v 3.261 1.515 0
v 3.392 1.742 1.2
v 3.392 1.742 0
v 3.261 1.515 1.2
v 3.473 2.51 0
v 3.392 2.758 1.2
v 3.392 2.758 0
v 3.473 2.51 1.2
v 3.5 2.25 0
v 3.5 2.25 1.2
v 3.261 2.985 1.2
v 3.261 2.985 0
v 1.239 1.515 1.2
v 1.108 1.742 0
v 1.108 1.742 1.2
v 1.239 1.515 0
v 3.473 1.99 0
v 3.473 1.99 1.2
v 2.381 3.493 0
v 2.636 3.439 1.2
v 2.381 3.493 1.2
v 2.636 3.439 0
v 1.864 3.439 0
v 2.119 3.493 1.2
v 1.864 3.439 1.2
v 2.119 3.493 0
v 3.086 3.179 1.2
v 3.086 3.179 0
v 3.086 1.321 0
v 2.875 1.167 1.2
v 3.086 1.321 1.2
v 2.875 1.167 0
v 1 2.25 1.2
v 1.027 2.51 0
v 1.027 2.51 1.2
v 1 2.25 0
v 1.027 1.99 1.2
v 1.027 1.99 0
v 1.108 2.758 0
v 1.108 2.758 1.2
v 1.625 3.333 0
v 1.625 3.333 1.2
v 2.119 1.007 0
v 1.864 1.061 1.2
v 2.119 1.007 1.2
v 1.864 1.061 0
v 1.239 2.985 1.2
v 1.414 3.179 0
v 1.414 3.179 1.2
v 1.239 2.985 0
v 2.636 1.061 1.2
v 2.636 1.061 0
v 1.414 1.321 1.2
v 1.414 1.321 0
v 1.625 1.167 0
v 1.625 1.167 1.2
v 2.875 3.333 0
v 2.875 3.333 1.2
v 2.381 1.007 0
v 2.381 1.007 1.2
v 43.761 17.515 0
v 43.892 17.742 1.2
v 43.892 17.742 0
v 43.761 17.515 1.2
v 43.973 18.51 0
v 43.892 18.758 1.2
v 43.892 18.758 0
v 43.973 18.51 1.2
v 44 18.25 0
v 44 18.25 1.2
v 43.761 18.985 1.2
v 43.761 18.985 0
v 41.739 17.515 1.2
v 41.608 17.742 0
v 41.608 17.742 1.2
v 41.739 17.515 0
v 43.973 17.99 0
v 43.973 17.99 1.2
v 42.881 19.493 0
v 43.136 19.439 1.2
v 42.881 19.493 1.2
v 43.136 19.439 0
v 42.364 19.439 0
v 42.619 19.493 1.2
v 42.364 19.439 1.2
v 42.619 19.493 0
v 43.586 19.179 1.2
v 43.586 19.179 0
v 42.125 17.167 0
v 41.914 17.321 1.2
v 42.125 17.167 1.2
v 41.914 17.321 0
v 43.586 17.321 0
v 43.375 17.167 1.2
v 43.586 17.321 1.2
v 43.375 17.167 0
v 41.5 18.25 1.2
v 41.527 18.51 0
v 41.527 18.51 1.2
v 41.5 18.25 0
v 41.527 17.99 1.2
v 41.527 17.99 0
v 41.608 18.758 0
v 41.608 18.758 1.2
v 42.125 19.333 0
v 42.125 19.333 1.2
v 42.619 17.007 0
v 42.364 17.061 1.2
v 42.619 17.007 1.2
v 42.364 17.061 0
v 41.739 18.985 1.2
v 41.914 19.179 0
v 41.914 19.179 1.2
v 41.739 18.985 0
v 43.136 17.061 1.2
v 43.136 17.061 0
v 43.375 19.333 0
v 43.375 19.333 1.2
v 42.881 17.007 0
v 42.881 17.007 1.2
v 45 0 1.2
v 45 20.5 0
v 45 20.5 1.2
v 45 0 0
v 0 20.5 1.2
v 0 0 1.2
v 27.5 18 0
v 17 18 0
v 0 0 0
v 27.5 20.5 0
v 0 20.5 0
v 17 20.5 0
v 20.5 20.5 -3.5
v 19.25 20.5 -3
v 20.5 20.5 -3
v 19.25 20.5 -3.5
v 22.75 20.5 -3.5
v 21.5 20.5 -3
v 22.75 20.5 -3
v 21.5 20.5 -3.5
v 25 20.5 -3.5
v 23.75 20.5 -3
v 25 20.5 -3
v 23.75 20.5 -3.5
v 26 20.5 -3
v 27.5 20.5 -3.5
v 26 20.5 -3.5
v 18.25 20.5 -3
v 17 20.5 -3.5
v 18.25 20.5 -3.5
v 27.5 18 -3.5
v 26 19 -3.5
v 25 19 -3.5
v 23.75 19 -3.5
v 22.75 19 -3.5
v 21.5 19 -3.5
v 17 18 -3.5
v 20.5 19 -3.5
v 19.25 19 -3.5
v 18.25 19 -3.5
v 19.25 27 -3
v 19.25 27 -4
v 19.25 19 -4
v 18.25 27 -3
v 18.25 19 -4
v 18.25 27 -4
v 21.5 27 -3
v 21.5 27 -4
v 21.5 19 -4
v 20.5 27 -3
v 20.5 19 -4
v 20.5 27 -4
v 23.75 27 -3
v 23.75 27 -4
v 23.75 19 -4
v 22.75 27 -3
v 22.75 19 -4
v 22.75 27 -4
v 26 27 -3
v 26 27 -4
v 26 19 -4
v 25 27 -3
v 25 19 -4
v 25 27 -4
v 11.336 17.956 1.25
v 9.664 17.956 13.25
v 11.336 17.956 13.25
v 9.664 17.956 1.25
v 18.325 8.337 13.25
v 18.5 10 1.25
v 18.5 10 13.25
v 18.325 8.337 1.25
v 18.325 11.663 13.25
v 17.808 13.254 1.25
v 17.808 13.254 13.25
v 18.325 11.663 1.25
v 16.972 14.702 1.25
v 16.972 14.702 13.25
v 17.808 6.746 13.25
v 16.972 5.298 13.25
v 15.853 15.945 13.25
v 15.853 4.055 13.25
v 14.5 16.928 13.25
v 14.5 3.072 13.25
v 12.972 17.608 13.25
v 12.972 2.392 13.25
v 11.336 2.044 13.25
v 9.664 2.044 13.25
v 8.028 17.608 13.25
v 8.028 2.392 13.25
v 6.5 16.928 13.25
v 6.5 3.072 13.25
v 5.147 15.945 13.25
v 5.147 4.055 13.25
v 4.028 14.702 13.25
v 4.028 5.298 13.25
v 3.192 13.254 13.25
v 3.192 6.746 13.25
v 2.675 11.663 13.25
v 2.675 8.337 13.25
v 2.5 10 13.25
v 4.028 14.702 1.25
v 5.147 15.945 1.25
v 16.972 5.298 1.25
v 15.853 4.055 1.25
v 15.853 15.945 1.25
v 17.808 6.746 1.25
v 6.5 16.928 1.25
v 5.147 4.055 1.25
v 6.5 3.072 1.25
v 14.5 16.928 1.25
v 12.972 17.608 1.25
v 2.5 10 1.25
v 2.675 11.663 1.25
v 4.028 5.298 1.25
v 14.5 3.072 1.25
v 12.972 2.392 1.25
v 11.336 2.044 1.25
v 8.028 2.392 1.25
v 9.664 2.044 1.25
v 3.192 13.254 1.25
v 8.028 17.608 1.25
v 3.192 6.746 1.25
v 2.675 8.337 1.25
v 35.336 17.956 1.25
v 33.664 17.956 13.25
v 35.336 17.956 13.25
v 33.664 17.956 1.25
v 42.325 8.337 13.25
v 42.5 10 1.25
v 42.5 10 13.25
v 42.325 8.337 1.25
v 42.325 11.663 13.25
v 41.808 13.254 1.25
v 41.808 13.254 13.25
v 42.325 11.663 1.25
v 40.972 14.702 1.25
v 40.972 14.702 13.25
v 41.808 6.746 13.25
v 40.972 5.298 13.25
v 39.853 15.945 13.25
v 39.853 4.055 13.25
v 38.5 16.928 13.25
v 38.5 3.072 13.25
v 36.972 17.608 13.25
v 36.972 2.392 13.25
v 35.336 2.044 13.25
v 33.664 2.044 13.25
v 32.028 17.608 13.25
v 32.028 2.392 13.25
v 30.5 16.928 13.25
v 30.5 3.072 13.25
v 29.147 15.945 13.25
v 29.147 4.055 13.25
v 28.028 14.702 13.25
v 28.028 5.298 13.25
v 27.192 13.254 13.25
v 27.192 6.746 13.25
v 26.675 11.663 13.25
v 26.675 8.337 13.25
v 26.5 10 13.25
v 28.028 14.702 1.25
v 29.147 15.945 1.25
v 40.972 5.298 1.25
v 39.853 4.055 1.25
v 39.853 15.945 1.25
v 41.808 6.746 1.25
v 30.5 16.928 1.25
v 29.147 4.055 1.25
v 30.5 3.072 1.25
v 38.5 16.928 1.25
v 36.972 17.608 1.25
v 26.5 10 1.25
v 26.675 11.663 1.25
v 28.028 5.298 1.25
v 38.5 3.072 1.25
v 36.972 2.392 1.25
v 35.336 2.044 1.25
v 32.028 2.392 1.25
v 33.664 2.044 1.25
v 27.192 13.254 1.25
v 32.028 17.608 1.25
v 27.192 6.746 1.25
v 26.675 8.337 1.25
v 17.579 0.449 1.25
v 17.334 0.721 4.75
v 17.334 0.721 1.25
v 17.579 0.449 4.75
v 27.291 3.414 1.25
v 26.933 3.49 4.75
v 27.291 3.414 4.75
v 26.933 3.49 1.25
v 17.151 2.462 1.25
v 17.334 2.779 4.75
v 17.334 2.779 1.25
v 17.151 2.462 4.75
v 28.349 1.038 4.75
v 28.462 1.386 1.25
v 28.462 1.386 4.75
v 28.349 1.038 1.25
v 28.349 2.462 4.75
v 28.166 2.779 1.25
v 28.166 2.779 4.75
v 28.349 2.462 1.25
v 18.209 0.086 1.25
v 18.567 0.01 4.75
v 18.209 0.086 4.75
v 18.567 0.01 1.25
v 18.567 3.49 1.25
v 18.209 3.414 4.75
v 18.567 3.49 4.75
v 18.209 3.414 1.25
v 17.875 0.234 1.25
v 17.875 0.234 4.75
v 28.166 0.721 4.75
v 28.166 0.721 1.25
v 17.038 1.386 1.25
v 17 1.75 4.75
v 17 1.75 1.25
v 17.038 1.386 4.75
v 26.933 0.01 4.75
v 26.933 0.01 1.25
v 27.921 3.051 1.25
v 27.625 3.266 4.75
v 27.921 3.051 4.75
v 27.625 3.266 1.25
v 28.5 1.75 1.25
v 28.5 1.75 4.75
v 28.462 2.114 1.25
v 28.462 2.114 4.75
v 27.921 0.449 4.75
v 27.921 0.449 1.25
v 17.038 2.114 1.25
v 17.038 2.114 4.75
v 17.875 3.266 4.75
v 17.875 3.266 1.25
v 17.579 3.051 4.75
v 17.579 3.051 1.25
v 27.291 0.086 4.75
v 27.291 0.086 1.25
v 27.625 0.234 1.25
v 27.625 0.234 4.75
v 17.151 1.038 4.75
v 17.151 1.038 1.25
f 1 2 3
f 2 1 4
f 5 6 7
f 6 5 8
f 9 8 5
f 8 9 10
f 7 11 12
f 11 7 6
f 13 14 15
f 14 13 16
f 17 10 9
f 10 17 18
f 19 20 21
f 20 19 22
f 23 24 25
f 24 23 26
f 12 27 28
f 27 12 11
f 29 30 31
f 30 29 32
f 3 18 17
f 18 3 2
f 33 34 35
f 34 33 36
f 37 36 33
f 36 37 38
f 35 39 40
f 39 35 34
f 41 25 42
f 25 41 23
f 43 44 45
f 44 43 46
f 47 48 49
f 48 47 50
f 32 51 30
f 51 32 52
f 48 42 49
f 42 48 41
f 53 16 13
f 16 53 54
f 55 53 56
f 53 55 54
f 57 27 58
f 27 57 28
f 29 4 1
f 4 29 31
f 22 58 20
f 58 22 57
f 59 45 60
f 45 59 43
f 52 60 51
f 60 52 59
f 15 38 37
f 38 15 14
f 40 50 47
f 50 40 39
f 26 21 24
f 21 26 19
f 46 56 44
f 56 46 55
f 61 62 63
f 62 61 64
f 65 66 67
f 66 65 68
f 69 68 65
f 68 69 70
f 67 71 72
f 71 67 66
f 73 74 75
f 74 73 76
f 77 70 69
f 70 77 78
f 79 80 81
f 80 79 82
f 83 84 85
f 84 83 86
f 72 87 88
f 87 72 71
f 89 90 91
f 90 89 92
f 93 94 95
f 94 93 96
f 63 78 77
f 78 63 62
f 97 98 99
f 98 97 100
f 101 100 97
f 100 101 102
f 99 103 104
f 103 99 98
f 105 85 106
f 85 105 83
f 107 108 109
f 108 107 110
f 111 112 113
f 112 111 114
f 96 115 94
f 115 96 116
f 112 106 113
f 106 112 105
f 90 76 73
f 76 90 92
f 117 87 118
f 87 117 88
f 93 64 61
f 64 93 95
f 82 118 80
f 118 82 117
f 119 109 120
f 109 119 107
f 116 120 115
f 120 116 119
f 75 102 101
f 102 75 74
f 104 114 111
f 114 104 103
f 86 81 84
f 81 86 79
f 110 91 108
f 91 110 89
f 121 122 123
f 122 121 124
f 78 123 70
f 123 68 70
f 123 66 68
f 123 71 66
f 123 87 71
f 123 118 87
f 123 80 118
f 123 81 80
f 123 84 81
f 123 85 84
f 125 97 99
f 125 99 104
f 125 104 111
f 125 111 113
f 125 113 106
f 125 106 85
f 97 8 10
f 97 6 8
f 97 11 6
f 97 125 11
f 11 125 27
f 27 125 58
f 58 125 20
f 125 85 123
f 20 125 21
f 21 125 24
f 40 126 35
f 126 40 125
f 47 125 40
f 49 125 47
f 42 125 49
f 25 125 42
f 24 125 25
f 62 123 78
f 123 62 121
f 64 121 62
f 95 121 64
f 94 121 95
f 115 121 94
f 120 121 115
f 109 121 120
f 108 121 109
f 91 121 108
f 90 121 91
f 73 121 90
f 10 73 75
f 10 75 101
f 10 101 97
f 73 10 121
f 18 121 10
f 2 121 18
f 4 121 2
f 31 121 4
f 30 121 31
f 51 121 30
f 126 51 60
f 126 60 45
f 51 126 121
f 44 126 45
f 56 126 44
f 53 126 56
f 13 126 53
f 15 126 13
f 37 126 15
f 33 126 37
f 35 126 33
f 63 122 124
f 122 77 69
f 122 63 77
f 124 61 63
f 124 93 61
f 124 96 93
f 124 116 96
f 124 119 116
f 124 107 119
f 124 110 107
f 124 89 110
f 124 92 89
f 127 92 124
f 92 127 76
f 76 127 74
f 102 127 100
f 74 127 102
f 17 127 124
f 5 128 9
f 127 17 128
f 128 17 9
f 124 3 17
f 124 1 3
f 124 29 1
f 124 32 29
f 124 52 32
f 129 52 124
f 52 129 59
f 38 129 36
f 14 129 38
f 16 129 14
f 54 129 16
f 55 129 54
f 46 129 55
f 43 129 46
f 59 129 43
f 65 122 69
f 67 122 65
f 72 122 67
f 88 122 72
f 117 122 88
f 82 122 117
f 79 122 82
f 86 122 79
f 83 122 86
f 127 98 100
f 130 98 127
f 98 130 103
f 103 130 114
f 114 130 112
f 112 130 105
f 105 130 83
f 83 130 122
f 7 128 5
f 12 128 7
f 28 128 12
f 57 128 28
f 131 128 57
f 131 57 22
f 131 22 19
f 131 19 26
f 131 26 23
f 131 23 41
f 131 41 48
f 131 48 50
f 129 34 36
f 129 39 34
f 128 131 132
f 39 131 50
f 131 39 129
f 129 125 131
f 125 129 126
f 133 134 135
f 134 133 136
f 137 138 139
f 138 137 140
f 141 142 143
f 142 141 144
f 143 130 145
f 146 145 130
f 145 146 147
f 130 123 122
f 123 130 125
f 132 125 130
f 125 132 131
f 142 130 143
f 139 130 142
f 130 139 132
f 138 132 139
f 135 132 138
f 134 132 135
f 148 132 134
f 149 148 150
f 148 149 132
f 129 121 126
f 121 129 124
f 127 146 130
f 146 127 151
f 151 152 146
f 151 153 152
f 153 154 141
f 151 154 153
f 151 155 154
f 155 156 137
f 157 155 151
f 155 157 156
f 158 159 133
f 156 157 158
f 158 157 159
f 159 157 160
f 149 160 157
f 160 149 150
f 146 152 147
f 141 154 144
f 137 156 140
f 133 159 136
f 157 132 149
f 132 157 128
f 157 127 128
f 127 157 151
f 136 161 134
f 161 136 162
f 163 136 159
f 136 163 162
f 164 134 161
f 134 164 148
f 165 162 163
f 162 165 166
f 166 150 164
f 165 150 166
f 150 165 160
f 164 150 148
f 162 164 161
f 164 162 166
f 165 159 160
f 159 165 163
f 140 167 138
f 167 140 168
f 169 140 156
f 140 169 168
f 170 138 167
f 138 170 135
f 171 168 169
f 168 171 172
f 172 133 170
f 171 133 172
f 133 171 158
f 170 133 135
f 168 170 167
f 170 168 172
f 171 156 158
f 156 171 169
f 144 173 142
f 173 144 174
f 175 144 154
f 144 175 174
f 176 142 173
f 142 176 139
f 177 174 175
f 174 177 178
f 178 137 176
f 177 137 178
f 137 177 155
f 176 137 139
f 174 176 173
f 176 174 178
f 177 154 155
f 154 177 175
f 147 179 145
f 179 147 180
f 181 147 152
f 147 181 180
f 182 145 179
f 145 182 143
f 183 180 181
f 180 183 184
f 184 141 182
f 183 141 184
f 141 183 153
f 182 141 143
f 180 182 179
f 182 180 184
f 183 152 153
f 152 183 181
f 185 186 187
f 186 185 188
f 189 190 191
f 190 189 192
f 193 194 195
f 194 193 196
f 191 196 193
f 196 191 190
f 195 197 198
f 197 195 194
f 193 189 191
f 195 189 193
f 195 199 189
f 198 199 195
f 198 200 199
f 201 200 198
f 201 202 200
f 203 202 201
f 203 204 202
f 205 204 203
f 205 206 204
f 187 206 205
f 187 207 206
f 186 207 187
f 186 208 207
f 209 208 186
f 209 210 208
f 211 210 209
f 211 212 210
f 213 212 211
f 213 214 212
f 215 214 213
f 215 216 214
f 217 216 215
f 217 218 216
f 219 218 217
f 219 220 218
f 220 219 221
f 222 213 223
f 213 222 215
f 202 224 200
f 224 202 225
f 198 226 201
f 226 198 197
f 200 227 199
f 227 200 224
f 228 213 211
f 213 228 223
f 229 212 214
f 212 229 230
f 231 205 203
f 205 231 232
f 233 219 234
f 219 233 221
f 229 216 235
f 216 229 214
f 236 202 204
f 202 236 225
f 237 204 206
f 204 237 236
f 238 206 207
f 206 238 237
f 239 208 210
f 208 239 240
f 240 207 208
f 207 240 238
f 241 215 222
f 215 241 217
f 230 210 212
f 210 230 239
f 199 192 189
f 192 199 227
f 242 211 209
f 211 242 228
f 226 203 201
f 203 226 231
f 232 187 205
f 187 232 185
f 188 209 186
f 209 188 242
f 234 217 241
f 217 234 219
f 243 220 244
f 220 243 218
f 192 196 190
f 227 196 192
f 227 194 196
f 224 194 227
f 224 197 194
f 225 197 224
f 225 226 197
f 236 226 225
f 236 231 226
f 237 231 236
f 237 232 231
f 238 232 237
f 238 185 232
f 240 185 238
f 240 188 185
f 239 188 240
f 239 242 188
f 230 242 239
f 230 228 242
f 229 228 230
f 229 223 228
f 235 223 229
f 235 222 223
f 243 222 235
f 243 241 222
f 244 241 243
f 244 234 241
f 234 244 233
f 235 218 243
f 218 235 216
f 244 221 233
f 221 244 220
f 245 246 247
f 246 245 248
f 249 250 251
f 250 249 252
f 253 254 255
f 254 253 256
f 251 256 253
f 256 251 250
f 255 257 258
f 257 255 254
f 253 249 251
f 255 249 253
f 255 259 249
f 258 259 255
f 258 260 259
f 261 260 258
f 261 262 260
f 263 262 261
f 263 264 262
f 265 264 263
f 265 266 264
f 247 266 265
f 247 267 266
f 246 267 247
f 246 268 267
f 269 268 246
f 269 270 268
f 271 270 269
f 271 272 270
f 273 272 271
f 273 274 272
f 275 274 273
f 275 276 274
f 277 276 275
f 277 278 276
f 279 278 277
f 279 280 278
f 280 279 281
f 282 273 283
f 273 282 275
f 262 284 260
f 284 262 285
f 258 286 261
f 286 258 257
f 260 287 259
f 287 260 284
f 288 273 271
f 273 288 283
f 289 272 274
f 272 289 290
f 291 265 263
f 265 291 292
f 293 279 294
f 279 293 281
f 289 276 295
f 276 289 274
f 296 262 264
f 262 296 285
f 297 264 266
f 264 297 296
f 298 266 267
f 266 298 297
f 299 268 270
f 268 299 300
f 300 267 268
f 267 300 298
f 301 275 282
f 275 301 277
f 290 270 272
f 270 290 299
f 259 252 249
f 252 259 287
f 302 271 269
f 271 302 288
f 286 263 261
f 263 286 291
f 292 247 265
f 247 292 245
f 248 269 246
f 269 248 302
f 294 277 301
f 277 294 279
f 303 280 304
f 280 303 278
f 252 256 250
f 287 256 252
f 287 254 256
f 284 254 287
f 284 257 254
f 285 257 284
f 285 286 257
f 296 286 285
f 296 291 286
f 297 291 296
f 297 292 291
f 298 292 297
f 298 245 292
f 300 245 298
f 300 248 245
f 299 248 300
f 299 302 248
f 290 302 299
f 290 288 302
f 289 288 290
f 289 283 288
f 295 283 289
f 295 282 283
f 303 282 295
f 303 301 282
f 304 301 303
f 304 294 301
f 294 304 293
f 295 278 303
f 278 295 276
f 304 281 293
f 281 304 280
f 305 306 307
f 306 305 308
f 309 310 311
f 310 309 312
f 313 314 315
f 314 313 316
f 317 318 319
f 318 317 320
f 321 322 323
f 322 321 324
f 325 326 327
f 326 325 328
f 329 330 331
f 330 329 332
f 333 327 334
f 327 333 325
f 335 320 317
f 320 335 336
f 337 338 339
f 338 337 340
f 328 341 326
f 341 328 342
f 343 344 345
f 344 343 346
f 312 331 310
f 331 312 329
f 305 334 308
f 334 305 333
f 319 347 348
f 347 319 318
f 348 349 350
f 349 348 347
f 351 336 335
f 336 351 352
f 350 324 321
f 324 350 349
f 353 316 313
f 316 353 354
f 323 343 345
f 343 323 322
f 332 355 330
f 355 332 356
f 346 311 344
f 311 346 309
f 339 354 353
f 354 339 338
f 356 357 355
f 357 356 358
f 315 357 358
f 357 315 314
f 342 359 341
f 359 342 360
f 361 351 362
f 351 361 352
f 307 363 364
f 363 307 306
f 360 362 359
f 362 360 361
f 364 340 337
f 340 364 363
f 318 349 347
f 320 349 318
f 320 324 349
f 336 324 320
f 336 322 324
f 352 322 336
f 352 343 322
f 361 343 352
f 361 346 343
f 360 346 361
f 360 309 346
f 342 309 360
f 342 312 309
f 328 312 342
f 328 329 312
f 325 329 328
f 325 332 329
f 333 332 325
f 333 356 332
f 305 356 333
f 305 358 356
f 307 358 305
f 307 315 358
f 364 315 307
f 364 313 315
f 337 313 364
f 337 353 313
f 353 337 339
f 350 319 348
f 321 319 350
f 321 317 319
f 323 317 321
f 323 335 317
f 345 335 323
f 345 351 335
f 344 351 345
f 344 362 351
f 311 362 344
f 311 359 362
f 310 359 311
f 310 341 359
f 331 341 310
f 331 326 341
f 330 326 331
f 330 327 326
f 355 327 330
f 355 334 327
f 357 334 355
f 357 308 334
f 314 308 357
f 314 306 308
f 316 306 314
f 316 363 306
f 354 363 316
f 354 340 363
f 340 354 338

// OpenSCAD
// file: robot-platform-loop-bracket.scad
// -*-C-*-
// Model for 2WD turtle robot IR sensor mounting bracket.
//
// This bracket is part of the "Turtle - 2WD Mobile Platform"
// manufactured by DFRobot and featured in the book "Make an Arduino-
// Controlled Robot" by Michael Margolis.
//
// Copyright 2013 Brian Davis
//
// License: LGPL 2.1 or later

module robot_platform_loop_bracket() {
  color("black")
  // Center the model.
  translate([0, -16.5, -3.95])
    union() {
      difference() {
        union() {
          // Rounded upper portion of main bracket body.
          translate([0, 21.5, 0])
            cylinder(r=11.5, h=1.5);
          // Rectangular lower portion of main bracket body.
          translate([-11.5, 0, 0])
            cube([23, 21.5, 1.5]);
        }
        union() {
          // Main loop hole.
          translate([0, 21.5, -1])
            cylinder(r=9, h=3);
          // Left mounting hole.
          translate([-7, 10, -1])
            cylinder(r=1.5, h=3);
          // Bottom mounting hole.
          translate([7, 10, -1])
            cylinder(r=1.5, h=3);
        }
      }
      // Perpindicular bottom mount point.
      // NOTE: forward edge is rounded.
      translate([-11.5, 0, 0])
        rotate([90, 0, 0])
          difference() {
            cube([23, 7.9, 1.5]);
            union() {
              // Left bottom mounting hole.
              translate([3.5, 4.45, -1])
                cylinder(r=1.5, h=3);
              // Right bottom mounting hole.
              translate([20, 4.45, -1])
                cylinder(r=1.5, h=3);
              // Center bottom mounting hole.
              translate([11.5, 4.45, -1])
                cylinder(r=1.5, h=3);
            }
          }
      }
}

// Test renders.
$fn=30;

robot_platform_loop_bracket();
// main file
// -*-C-*-
// Models of various ultrasonic distance sensor units.
//
// Several very similar units are modeled here because
// they have minor differences in dimensions which can
// interfere with getting a good fit when attempting to
// use one unit with a design intended for a different one.
//
// NOTE: these sensors are similar to the Parallax PING)))
// sensor except for the fact that the PING))) has 3 pins.
// There may also be other minor differences in sizing.
//
// Copyright 2013, Brian Davis
//
// License: LGPL 2.1 or later

use <robot-platform-loop-bracket.scad>

// HY-SRF05 5 pin sensor.
module ultrasonic_hy_srf05() {
  // Printed circuit board.
  color("green")
  difference() {
    cube([45, 20.5, 1.6]);
    union() {
      translate([2.25, 2.25, -0.1])
        cylinder(r=1.25, h=5);
      translate([42.75, 18.25, -0.1])
        cylinder(r=1.25, h=5);
    }
  }

  // Left ultrasonic sensor.
  color("silver")
  translate([10.5, 10, 1.6])
    cylinder(r=8, h=12);

  // Right ultrasonic sensor.
  color("silver")
  translate([34.5, 10, 1.6])
    cylinder(r=8, h=12);

  // Oscillator chip.
  color("silver")
  hull() {
    translate([18.75, 1.75, 1.6])
      cylinder(r=1.75, h=3.5);

    translate([26.75, 1.75, 1.6])
      cylinder(r=1.75, h=3.5);
  }

  // 5 pin connector.
  union() {
    color("black")
    translate([15.75, 18, -3.5])
      cube([13, 2.5, 3.5]);

    color("silver")
    translate([16.75, 19, -4])
      cube([1, 8, 1]);

    color("silver")
    translate([19.25, 19, -4])
      cube([1, 8, 1]);

    color("silver")
    translate([22, 19, -4])
      cube([1, 8, 1]);

    color("silver")
    translate([24.5, 19, -4])
      cube([1, 8, 1]);

    color("silver")
    translate([27, 19, -4])
      cube([1, 8, 1]);
  }
}

// HC-SR04 4-pin sensor.
module ultrasonic_hc_sr04() {
  // Printed circuit board.
  color("green")
  difference() {
    cube([45, 20.5, 1.2]);
    union() {
      translate([2.25, 2.25, -0.1])
        cylinder(r=1.25, h=5);
      translate([42.75, 18.25, -0.1])
        cylinder(r=1.25, h=5);
    }
  }

  // Left ultrasonic sensor.
  color("silver")
  translate([10.5, 10, 1.25])
    cylinder(r=8, h=12);

  // Right ultrasonic sensor.
  color("silver")
  translate([34.5, 10, 1.25])
    cylinder(r=8, h=12);

  // Oscillator chip.
  color("silver")
  hull() {
    translate([18.75, 1.75, 1.25])
      cylinder(r=1.75, h=3.5);

    translate([26.75, 1.75, 1.25])
      cylinder(r=1.75, h=3.5);
  }

  // 4 pin connector.
  union() {
    color("black")
    translate([17, 18, -3.5])
      cube([10.5, 2.5, 3.5]);

    color("silver")
    translate([18.25, 19, -4])
      cube([1, 8, 1]);

    color("silver")
    translate([20.5, 19, -4])
      cube([1, 8, 1]);

    color("silver")
    translate([22.75, 19, -4])
      cube([1, 8, 1]);

    color("silver")
    translate([25, 19, -4])
      cube([1, 8, 1]);
  }
}

$fn=30;

*ultrasonic_hy_srf05();

ultrasonic_hc_sr04();
